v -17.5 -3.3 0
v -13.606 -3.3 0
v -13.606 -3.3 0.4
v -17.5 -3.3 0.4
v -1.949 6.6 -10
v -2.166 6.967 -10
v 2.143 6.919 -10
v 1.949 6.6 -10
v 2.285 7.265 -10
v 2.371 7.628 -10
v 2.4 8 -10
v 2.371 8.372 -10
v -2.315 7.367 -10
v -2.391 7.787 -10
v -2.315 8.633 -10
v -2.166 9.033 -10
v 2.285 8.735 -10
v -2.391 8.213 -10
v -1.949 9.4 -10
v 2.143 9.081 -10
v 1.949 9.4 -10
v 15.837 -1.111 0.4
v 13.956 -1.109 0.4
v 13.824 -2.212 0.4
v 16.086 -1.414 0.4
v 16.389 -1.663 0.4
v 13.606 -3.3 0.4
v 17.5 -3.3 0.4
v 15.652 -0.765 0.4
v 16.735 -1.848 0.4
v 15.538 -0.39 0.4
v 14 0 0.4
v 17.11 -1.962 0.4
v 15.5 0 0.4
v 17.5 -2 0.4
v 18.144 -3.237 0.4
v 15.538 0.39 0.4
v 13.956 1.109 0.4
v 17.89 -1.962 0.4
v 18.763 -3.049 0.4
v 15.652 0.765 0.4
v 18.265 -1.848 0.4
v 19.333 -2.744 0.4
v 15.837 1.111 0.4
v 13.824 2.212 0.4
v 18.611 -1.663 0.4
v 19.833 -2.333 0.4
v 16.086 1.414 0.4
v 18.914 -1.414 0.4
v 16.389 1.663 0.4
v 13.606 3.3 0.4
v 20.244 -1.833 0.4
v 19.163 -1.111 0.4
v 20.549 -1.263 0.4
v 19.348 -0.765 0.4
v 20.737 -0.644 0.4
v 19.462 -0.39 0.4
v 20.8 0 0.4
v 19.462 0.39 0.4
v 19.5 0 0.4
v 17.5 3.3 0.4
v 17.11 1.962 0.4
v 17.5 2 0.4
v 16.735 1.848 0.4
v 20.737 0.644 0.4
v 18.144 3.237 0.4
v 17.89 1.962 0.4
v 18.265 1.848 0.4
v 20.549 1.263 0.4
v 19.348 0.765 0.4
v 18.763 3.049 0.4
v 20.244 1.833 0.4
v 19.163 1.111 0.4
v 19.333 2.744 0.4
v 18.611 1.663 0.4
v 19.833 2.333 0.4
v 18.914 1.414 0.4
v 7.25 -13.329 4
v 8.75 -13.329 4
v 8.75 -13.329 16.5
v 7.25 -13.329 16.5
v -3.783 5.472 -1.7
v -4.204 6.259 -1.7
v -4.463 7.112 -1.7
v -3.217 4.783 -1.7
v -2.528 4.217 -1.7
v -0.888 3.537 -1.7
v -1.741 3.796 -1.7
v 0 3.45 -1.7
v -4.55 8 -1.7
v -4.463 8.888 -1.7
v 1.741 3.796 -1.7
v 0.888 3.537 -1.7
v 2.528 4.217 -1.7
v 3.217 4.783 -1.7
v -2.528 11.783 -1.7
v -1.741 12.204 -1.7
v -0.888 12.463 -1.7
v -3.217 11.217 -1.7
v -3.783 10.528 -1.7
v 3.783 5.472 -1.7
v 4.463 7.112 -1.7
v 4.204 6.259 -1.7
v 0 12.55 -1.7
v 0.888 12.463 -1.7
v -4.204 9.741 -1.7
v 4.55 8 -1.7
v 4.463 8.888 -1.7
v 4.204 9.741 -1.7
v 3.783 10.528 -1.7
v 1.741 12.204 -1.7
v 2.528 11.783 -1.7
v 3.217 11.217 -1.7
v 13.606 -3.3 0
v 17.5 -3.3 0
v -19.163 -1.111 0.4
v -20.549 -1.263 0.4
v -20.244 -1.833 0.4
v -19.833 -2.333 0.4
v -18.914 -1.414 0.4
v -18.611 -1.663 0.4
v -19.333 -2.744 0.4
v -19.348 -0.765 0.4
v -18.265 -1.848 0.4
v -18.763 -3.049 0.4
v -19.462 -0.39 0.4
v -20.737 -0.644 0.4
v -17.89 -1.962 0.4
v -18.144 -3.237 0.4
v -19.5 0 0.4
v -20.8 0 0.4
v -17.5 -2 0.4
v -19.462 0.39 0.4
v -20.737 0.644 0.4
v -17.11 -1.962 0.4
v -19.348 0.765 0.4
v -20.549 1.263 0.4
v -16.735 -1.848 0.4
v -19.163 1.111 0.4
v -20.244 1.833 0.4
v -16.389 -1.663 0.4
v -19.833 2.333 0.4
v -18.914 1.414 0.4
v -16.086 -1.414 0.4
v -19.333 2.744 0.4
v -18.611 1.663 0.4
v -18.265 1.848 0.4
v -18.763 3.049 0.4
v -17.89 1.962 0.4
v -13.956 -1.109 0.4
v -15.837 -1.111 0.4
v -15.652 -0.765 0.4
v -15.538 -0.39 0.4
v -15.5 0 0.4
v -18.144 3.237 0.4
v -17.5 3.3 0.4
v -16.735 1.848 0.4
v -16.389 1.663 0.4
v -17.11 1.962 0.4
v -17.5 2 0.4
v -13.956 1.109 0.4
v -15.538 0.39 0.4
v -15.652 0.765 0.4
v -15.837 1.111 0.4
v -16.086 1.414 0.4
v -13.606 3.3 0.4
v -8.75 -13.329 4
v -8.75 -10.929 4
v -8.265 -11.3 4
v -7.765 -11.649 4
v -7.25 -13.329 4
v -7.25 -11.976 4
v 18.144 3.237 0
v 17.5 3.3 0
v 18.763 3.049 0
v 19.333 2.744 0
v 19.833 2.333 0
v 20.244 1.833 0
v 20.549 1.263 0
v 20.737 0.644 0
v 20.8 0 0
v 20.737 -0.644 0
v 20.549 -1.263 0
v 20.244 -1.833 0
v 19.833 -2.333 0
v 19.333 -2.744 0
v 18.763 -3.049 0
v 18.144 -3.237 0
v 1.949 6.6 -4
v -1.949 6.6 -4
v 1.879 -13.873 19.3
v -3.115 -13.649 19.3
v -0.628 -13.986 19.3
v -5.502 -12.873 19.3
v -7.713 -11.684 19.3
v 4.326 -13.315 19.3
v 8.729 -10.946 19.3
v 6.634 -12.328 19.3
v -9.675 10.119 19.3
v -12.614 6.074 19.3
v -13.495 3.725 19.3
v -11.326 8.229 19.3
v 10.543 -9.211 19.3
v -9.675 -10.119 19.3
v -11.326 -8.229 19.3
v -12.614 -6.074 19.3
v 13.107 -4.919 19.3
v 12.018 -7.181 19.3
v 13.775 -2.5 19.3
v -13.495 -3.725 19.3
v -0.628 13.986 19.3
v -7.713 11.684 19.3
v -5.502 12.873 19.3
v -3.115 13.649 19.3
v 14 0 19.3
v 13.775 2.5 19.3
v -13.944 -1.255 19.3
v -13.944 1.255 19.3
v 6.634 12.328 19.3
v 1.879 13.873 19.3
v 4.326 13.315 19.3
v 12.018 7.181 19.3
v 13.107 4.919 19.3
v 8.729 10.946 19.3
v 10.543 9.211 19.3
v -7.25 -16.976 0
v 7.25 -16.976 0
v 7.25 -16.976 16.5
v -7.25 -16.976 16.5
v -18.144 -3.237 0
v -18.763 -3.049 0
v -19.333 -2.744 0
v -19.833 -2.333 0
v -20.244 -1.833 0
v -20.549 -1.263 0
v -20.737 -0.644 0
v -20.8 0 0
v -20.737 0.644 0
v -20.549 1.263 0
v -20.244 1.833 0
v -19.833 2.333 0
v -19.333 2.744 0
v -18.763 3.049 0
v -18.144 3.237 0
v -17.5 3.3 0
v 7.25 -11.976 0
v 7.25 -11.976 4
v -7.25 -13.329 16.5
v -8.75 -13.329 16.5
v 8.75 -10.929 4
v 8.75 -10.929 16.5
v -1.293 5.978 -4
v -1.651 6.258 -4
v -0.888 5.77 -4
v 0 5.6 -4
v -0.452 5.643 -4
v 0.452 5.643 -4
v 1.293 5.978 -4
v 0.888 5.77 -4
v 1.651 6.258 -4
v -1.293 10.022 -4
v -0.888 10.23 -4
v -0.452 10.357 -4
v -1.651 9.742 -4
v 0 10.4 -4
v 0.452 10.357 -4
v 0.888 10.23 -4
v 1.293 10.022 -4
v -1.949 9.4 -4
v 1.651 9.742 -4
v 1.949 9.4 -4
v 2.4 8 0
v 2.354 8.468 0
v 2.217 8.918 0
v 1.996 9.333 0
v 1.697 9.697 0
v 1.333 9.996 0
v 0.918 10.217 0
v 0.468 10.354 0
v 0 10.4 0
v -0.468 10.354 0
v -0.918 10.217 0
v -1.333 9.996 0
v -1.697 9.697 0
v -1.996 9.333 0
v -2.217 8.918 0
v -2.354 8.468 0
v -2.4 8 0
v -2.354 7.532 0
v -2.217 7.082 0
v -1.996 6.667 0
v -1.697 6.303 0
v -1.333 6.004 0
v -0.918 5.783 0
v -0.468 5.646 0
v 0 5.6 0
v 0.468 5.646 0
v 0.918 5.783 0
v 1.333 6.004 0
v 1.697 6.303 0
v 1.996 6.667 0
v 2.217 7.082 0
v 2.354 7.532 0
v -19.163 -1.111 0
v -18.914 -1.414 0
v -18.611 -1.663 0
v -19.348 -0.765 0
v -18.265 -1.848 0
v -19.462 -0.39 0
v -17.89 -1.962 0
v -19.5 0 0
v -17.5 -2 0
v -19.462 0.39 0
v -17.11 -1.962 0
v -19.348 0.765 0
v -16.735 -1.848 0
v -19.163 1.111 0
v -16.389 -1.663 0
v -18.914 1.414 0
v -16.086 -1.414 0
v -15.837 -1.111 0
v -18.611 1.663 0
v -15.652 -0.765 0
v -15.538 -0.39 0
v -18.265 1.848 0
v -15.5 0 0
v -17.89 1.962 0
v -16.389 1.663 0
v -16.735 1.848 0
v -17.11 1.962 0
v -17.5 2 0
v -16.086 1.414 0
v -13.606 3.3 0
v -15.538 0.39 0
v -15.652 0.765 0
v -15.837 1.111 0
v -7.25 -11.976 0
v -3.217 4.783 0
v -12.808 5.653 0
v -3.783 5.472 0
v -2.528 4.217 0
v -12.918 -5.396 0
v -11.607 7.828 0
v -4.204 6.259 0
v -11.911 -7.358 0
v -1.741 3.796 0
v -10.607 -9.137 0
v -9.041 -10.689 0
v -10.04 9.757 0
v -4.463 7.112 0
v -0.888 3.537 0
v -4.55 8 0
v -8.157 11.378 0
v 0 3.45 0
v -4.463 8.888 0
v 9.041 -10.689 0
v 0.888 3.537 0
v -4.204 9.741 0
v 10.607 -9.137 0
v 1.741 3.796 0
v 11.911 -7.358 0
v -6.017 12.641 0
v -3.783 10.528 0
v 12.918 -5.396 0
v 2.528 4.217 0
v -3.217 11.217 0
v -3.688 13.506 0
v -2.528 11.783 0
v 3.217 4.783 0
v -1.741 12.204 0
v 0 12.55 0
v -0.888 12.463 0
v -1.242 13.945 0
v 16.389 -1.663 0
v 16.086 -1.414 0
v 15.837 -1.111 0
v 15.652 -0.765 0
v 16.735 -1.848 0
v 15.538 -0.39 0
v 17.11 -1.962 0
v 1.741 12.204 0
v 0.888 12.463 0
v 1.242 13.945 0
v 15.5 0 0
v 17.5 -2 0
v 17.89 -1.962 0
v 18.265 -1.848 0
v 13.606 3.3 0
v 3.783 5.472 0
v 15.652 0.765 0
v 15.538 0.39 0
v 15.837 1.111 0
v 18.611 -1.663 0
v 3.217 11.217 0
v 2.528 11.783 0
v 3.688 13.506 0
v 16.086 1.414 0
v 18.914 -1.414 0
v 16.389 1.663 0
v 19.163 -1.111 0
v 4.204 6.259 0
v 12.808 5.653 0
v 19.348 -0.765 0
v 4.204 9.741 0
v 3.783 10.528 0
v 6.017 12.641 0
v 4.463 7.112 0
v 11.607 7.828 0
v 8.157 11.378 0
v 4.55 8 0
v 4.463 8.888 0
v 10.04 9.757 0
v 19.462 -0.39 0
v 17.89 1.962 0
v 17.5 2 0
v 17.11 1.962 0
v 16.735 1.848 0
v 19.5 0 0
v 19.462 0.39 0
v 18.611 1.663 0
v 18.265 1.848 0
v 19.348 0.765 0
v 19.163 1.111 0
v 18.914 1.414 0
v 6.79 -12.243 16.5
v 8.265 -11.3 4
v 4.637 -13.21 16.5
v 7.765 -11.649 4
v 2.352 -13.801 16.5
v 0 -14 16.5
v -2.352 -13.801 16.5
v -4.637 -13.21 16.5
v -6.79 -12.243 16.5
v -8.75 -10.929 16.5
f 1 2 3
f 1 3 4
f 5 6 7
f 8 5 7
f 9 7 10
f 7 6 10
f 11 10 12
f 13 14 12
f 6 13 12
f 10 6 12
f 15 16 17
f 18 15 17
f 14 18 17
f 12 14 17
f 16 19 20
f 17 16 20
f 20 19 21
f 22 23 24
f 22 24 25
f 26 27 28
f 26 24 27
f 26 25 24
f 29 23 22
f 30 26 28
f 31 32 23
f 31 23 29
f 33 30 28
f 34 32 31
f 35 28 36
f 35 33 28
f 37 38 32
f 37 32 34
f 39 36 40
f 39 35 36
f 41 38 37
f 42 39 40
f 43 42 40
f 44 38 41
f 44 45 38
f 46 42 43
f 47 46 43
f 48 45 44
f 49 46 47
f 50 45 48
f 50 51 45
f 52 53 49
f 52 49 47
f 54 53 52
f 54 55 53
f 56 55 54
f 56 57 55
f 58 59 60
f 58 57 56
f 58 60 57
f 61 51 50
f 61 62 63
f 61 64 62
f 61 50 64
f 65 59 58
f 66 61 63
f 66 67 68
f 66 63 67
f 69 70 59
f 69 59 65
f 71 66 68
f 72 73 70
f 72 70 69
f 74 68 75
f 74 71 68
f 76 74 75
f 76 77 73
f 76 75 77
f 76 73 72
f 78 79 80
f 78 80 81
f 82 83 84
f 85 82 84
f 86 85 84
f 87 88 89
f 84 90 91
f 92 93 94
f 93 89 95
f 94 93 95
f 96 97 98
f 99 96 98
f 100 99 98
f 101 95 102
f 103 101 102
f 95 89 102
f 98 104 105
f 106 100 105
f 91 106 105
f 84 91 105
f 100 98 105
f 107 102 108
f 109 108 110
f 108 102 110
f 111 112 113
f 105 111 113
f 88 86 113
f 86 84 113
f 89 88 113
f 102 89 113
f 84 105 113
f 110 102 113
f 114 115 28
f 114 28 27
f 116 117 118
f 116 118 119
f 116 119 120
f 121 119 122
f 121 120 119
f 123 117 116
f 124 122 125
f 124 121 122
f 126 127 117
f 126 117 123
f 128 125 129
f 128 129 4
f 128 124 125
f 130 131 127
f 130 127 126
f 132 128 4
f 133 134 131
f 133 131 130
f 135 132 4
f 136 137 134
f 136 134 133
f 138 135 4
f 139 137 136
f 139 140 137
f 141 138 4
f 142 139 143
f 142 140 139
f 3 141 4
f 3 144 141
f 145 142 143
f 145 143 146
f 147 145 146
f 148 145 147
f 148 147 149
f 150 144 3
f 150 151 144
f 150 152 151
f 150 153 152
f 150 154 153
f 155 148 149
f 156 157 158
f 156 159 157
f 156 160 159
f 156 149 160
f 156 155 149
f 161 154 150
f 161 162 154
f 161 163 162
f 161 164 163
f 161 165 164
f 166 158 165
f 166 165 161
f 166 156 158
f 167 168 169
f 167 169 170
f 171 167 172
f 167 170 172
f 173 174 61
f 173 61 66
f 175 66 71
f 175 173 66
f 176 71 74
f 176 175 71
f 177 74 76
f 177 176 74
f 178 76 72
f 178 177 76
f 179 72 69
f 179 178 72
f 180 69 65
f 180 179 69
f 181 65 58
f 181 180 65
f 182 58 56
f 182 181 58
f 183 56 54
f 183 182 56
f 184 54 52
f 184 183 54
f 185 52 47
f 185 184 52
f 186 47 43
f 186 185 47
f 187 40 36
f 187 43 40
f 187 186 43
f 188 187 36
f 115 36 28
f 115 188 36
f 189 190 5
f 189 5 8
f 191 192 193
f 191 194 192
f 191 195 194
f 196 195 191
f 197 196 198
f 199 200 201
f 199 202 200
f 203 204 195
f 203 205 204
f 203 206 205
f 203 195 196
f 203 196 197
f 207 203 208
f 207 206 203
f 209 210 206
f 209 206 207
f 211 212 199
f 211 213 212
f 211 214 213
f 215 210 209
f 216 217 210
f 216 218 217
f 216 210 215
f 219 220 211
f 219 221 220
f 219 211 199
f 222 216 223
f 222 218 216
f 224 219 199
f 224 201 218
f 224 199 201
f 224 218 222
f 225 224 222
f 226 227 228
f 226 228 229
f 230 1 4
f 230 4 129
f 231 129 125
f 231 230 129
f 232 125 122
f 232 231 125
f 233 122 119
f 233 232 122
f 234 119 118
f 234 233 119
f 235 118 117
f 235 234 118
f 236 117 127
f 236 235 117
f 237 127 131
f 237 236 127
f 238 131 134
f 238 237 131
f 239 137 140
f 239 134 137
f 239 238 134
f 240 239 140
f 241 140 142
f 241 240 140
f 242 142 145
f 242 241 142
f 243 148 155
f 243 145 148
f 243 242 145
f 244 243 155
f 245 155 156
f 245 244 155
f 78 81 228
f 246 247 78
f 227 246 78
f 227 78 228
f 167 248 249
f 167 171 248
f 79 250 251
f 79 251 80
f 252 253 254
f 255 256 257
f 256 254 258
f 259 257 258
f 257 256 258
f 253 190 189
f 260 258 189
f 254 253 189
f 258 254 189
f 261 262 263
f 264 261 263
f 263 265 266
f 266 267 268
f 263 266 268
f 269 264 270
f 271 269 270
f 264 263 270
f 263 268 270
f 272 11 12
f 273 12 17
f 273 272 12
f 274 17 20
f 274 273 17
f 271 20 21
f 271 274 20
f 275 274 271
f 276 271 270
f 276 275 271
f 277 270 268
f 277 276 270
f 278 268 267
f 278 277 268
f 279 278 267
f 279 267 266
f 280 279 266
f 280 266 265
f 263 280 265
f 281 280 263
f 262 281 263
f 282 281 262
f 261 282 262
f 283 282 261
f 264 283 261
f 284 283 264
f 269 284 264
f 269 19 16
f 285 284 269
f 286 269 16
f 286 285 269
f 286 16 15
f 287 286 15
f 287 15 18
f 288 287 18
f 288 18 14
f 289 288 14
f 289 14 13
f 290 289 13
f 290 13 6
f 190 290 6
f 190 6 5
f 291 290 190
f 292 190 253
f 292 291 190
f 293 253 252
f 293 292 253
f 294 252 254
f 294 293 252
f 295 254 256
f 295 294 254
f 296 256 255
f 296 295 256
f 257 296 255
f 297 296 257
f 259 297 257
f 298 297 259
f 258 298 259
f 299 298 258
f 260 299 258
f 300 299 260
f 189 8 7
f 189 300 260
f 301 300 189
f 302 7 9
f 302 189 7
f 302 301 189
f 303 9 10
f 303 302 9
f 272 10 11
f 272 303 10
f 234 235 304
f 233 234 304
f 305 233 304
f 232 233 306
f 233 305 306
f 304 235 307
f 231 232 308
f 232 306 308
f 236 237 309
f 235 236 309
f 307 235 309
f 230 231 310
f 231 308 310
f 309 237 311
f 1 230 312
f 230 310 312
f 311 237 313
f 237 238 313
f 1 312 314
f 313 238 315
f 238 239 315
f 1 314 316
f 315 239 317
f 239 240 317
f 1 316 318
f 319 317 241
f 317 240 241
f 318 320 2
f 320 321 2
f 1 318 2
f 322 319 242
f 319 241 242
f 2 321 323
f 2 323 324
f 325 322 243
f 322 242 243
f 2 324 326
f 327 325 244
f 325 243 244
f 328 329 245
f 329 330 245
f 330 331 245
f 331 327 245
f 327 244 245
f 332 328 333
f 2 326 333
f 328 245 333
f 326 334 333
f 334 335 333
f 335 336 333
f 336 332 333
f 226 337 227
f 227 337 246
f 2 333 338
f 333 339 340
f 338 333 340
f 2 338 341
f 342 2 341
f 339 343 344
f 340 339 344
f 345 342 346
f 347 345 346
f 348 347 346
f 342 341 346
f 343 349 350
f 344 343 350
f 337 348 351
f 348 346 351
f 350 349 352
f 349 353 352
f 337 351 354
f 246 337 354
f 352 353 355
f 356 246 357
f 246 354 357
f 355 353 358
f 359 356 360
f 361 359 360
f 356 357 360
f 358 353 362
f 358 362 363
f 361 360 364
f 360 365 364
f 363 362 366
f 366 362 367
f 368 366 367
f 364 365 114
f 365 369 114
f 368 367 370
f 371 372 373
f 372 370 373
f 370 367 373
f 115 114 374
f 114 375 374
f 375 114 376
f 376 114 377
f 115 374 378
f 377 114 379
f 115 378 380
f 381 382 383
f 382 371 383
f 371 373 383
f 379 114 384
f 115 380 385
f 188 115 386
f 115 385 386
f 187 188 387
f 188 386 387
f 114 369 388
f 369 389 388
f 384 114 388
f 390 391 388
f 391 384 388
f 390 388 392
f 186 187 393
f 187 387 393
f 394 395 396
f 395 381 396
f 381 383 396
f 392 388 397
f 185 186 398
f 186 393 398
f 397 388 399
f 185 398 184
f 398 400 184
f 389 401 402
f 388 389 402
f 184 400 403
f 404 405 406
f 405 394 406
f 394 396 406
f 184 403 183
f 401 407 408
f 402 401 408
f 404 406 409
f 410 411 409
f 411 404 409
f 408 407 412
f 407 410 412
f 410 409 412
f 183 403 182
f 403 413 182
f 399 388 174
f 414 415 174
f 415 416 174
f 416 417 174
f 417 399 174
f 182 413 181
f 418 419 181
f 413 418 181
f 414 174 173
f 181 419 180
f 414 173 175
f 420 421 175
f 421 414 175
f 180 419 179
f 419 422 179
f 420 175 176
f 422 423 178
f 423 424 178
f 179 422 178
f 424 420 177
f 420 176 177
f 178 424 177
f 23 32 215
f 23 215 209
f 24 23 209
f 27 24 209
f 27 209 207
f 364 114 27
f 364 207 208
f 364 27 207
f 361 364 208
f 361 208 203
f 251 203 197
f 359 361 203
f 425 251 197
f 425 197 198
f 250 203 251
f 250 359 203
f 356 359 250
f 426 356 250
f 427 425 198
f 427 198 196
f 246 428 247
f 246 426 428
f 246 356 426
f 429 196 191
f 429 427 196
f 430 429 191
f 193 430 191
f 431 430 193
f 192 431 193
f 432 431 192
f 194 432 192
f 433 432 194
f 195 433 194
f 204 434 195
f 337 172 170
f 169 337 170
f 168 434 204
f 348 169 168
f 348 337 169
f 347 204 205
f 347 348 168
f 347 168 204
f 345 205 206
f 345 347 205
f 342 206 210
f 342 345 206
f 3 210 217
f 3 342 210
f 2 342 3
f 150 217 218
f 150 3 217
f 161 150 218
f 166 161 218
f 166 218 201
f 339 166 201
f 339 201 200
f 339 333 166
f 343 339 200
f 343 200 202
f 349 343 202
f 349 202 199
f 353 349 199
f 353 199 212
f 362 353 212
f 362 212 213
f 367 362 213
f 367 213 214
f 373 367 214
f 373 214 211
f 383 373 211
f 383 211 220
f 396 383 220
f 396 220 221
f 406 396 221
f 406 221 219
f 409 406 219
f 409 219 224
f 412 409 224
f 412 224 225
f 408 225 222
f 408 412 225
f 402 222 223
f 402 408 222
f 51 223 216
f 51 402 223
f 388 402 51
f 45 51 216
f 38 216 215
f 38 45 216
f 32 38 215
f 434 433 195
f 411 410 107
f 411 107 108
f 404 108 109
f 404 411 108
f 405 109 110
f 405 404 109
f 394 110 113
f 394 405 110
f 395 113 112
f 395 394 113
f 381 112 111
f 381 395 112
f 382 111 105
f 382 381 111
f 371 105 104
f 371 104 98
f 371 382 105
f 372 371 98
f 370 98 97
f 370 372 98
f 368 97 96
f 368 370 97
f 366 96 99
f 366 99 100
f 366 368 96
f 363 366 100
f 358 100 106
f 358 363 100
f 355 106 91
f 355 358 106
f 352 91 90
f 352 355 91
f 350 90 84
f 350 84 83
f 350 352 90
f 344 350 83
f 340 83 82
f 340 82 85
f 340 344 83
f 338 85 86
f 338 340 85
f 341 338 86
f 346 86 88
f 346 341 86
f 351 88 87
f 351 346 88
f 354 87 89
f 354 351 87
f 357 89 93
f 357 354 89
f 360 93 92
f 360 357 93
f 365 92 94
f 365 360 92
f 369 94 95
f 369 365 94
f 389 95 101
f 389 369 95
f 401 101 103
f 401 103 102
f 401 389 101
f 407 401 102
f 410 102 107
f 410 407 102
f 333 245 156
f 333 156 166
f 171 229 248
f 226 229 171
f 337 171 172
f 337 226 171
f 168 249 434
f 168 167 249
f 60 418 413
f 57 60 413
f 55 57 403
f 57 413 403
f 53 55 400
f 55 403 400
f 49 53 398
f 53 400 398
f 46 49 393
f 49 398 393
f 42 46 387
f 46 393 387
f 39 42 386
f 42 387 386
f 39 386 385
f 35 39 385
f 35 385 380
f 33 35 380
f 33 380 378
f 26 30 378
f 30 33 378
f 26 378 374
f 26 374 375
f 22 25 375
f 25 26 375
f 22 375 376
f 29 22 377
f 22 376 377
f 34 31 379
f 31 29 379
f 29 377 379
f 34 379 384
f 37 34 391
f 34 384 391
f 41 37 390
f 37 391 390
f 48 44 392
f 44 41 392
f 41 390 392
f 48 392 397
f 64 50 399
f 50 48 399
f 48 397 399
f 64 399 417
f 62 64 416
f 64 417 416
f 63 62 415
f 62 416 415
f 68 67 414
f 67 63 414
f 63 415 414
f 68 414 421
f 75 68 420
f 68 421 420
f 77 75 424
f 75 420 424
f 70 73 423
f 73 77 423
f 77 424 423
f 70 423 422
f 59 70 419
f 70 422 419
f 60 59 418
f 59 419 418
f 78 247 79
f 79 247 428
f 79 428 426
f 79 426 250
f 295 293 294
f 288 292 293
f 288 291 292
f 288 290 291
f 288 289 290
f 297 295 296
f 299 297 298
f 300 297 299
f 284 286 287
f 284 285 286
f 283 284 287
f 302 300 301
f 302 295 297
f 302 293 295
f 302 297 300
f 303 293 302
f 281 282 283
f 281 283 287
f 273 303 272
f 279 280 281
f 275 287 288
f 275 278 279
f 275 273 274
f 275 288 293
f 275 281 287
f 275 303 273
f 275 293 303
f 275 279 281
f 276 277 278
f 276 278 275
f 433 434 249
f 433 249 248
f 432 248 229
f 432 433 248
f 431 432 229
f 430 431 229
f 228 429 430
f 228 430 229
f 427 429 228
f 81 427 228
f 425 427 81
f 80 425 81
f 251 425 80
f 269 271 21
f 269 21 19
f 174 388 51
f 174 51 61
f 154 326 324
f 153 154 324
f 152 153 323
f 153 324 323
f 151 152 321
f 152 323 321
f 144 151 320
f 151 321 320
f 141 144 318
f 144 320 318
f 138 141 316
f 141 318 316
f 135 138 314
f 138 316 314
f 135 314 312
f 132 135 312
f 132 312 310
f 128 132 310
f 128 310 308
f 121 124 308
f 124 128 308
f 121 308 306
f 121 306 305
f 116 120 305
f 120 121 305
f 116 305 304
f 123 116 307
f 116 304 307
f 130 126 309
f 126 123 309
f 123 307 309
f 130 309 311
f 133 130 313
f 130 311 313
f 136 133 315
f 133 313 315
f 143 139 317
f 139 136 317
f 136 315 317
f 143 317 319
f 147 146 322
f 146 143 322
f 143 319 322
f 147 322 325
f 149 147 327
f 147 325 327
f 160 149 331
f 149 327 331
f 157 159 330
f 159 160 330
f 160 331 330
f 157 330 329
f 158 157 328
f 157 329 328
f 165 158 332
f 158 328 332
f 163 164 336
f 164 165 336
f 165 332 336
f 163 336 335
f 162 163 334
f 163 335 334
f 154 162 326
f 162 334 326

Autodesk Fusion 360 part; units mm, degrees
sketch "スケッチ1" plane through (0, 0, 0) normal (0, 0, 1) x (1, 0, 0)
  circle A0 centre (0, 0) radius 14
  line L0 (-40.284, 0) -> (46.998, 0) construction
  circle A1 centre (-17.5, 0) radius 2
  circle A2 centre (17.5, 0) radius 2
  circle A3 centre (17.5, 0) radius 3.3
  circle A4 centre (-17.5, 0) radius 3.3
  line L1 (-17.5, 3.3) -> (17.5, 3.3)
  line L2 (17.5, -3.3) -> (-17.5, -3.3)
  line L3 (-7.25, -11.9765) -> (7.25, -11.9765)
  line L4 (7.25, -11.9765) -> (7.25, -16.9765)
  line L5 (7.25, -16.9765) -> (-7.25, -16.9765)
  line L6 (-7.25, -16.9765) -> (-7.25, -11.9765)
  line L7 (-8.75, -10.9287) -> (8.75, -10.9287)
  line L8 (8.75, -10.9287) -> (8.75, -13.3287)
  line L9 (8.75, -13.3287) -> (-8.75, -13.3287)
  line L10 (-8.75, -13.3287) -> (-8.75, -10.9287)
  dimension "d1" = 28
  dimension "d2" = 4
  dimension "d3" = 4
  dimension "d4" = 35
  dimension "d5" = 17.5
  dimension "d6" = 1.3
  dimension "d7" = 1.3
  dimension "d8" = 14.5
  dimension "d9" = 5
  dimension "d10" = 17.5
  dimension "d11" = 2.4
extrude "押し出し1" add sketch "スケッチ1" along normal blind 0.4 contours A0 A4 L1 L2 | A0 A3 L1 L2 | A4 | A3 makes body 1 at (15.8685, -2.7774, 0) makes body 2 at (-15.8685, -2.7774, 0)
extrude "押し出し2" add sketch "スケッチ1" along normal blind 19.3 contours A0 L3 L7 | A0 L2 L7 | A0 L3 L9 | A0 L1 L2 | A0 L9 | A0 L1 bodies 1 2
extrude "押し出し3" add sketch "スケッチ1" along normal blind 16.5 contours A0 L6 L9 | A0 L4 L5 L6 L9 | A0 L4 L9 bodies 1
extrude "押し出し4" add sketch "スケッチ1" along normal blind 16.5 and the other way blind -4 contours A0 L6 L9 L10 | A0 L4 L8 L9 bodies 1
sketch "スケッチ2" plane through (0, 0, 0) normal (0, 0, 1) x (1, 0, 0)
  line L0 (17.5639, 8) -> (-17.5639, 8) construction
  line L1 (0, 0) -> (0, 18.0854) construction
  circle A0 centre (0, 8) radius 4.55
  circle A1 centre (0, 8) radius 2.4
  line L2 (1.9494, 9.4) -> (-1.9494, 9.4)
  line L3 (-1.9494, 6.6) -> (1.9494, 6.6)
  dimension "d22" = 8
  dimension "d23" = 9.1
  dimension "d24" = 4.8
  dimension "d25" = 2.8
  dimension "d26" = 1.4
extrude "押し出し5" add sketch "スケッチ2" against normal blind 1.7 contours A0 | A1 L2 L3 | A1 L2 | A1 L3 bodies 1
extrude "押し出し6" add sketch "スケッチ2" against normal blind 10 separate body contours A1 L2 L3 makes body 3
extrude "押し出し7" add sketch "スケッチ2" against normal blind 4 contours A1 L2 | A1 L3 bodies 3
equation "d3 = d2"
equation "d5 = d4 / 2"
equation "d26 = d25 / 2"
